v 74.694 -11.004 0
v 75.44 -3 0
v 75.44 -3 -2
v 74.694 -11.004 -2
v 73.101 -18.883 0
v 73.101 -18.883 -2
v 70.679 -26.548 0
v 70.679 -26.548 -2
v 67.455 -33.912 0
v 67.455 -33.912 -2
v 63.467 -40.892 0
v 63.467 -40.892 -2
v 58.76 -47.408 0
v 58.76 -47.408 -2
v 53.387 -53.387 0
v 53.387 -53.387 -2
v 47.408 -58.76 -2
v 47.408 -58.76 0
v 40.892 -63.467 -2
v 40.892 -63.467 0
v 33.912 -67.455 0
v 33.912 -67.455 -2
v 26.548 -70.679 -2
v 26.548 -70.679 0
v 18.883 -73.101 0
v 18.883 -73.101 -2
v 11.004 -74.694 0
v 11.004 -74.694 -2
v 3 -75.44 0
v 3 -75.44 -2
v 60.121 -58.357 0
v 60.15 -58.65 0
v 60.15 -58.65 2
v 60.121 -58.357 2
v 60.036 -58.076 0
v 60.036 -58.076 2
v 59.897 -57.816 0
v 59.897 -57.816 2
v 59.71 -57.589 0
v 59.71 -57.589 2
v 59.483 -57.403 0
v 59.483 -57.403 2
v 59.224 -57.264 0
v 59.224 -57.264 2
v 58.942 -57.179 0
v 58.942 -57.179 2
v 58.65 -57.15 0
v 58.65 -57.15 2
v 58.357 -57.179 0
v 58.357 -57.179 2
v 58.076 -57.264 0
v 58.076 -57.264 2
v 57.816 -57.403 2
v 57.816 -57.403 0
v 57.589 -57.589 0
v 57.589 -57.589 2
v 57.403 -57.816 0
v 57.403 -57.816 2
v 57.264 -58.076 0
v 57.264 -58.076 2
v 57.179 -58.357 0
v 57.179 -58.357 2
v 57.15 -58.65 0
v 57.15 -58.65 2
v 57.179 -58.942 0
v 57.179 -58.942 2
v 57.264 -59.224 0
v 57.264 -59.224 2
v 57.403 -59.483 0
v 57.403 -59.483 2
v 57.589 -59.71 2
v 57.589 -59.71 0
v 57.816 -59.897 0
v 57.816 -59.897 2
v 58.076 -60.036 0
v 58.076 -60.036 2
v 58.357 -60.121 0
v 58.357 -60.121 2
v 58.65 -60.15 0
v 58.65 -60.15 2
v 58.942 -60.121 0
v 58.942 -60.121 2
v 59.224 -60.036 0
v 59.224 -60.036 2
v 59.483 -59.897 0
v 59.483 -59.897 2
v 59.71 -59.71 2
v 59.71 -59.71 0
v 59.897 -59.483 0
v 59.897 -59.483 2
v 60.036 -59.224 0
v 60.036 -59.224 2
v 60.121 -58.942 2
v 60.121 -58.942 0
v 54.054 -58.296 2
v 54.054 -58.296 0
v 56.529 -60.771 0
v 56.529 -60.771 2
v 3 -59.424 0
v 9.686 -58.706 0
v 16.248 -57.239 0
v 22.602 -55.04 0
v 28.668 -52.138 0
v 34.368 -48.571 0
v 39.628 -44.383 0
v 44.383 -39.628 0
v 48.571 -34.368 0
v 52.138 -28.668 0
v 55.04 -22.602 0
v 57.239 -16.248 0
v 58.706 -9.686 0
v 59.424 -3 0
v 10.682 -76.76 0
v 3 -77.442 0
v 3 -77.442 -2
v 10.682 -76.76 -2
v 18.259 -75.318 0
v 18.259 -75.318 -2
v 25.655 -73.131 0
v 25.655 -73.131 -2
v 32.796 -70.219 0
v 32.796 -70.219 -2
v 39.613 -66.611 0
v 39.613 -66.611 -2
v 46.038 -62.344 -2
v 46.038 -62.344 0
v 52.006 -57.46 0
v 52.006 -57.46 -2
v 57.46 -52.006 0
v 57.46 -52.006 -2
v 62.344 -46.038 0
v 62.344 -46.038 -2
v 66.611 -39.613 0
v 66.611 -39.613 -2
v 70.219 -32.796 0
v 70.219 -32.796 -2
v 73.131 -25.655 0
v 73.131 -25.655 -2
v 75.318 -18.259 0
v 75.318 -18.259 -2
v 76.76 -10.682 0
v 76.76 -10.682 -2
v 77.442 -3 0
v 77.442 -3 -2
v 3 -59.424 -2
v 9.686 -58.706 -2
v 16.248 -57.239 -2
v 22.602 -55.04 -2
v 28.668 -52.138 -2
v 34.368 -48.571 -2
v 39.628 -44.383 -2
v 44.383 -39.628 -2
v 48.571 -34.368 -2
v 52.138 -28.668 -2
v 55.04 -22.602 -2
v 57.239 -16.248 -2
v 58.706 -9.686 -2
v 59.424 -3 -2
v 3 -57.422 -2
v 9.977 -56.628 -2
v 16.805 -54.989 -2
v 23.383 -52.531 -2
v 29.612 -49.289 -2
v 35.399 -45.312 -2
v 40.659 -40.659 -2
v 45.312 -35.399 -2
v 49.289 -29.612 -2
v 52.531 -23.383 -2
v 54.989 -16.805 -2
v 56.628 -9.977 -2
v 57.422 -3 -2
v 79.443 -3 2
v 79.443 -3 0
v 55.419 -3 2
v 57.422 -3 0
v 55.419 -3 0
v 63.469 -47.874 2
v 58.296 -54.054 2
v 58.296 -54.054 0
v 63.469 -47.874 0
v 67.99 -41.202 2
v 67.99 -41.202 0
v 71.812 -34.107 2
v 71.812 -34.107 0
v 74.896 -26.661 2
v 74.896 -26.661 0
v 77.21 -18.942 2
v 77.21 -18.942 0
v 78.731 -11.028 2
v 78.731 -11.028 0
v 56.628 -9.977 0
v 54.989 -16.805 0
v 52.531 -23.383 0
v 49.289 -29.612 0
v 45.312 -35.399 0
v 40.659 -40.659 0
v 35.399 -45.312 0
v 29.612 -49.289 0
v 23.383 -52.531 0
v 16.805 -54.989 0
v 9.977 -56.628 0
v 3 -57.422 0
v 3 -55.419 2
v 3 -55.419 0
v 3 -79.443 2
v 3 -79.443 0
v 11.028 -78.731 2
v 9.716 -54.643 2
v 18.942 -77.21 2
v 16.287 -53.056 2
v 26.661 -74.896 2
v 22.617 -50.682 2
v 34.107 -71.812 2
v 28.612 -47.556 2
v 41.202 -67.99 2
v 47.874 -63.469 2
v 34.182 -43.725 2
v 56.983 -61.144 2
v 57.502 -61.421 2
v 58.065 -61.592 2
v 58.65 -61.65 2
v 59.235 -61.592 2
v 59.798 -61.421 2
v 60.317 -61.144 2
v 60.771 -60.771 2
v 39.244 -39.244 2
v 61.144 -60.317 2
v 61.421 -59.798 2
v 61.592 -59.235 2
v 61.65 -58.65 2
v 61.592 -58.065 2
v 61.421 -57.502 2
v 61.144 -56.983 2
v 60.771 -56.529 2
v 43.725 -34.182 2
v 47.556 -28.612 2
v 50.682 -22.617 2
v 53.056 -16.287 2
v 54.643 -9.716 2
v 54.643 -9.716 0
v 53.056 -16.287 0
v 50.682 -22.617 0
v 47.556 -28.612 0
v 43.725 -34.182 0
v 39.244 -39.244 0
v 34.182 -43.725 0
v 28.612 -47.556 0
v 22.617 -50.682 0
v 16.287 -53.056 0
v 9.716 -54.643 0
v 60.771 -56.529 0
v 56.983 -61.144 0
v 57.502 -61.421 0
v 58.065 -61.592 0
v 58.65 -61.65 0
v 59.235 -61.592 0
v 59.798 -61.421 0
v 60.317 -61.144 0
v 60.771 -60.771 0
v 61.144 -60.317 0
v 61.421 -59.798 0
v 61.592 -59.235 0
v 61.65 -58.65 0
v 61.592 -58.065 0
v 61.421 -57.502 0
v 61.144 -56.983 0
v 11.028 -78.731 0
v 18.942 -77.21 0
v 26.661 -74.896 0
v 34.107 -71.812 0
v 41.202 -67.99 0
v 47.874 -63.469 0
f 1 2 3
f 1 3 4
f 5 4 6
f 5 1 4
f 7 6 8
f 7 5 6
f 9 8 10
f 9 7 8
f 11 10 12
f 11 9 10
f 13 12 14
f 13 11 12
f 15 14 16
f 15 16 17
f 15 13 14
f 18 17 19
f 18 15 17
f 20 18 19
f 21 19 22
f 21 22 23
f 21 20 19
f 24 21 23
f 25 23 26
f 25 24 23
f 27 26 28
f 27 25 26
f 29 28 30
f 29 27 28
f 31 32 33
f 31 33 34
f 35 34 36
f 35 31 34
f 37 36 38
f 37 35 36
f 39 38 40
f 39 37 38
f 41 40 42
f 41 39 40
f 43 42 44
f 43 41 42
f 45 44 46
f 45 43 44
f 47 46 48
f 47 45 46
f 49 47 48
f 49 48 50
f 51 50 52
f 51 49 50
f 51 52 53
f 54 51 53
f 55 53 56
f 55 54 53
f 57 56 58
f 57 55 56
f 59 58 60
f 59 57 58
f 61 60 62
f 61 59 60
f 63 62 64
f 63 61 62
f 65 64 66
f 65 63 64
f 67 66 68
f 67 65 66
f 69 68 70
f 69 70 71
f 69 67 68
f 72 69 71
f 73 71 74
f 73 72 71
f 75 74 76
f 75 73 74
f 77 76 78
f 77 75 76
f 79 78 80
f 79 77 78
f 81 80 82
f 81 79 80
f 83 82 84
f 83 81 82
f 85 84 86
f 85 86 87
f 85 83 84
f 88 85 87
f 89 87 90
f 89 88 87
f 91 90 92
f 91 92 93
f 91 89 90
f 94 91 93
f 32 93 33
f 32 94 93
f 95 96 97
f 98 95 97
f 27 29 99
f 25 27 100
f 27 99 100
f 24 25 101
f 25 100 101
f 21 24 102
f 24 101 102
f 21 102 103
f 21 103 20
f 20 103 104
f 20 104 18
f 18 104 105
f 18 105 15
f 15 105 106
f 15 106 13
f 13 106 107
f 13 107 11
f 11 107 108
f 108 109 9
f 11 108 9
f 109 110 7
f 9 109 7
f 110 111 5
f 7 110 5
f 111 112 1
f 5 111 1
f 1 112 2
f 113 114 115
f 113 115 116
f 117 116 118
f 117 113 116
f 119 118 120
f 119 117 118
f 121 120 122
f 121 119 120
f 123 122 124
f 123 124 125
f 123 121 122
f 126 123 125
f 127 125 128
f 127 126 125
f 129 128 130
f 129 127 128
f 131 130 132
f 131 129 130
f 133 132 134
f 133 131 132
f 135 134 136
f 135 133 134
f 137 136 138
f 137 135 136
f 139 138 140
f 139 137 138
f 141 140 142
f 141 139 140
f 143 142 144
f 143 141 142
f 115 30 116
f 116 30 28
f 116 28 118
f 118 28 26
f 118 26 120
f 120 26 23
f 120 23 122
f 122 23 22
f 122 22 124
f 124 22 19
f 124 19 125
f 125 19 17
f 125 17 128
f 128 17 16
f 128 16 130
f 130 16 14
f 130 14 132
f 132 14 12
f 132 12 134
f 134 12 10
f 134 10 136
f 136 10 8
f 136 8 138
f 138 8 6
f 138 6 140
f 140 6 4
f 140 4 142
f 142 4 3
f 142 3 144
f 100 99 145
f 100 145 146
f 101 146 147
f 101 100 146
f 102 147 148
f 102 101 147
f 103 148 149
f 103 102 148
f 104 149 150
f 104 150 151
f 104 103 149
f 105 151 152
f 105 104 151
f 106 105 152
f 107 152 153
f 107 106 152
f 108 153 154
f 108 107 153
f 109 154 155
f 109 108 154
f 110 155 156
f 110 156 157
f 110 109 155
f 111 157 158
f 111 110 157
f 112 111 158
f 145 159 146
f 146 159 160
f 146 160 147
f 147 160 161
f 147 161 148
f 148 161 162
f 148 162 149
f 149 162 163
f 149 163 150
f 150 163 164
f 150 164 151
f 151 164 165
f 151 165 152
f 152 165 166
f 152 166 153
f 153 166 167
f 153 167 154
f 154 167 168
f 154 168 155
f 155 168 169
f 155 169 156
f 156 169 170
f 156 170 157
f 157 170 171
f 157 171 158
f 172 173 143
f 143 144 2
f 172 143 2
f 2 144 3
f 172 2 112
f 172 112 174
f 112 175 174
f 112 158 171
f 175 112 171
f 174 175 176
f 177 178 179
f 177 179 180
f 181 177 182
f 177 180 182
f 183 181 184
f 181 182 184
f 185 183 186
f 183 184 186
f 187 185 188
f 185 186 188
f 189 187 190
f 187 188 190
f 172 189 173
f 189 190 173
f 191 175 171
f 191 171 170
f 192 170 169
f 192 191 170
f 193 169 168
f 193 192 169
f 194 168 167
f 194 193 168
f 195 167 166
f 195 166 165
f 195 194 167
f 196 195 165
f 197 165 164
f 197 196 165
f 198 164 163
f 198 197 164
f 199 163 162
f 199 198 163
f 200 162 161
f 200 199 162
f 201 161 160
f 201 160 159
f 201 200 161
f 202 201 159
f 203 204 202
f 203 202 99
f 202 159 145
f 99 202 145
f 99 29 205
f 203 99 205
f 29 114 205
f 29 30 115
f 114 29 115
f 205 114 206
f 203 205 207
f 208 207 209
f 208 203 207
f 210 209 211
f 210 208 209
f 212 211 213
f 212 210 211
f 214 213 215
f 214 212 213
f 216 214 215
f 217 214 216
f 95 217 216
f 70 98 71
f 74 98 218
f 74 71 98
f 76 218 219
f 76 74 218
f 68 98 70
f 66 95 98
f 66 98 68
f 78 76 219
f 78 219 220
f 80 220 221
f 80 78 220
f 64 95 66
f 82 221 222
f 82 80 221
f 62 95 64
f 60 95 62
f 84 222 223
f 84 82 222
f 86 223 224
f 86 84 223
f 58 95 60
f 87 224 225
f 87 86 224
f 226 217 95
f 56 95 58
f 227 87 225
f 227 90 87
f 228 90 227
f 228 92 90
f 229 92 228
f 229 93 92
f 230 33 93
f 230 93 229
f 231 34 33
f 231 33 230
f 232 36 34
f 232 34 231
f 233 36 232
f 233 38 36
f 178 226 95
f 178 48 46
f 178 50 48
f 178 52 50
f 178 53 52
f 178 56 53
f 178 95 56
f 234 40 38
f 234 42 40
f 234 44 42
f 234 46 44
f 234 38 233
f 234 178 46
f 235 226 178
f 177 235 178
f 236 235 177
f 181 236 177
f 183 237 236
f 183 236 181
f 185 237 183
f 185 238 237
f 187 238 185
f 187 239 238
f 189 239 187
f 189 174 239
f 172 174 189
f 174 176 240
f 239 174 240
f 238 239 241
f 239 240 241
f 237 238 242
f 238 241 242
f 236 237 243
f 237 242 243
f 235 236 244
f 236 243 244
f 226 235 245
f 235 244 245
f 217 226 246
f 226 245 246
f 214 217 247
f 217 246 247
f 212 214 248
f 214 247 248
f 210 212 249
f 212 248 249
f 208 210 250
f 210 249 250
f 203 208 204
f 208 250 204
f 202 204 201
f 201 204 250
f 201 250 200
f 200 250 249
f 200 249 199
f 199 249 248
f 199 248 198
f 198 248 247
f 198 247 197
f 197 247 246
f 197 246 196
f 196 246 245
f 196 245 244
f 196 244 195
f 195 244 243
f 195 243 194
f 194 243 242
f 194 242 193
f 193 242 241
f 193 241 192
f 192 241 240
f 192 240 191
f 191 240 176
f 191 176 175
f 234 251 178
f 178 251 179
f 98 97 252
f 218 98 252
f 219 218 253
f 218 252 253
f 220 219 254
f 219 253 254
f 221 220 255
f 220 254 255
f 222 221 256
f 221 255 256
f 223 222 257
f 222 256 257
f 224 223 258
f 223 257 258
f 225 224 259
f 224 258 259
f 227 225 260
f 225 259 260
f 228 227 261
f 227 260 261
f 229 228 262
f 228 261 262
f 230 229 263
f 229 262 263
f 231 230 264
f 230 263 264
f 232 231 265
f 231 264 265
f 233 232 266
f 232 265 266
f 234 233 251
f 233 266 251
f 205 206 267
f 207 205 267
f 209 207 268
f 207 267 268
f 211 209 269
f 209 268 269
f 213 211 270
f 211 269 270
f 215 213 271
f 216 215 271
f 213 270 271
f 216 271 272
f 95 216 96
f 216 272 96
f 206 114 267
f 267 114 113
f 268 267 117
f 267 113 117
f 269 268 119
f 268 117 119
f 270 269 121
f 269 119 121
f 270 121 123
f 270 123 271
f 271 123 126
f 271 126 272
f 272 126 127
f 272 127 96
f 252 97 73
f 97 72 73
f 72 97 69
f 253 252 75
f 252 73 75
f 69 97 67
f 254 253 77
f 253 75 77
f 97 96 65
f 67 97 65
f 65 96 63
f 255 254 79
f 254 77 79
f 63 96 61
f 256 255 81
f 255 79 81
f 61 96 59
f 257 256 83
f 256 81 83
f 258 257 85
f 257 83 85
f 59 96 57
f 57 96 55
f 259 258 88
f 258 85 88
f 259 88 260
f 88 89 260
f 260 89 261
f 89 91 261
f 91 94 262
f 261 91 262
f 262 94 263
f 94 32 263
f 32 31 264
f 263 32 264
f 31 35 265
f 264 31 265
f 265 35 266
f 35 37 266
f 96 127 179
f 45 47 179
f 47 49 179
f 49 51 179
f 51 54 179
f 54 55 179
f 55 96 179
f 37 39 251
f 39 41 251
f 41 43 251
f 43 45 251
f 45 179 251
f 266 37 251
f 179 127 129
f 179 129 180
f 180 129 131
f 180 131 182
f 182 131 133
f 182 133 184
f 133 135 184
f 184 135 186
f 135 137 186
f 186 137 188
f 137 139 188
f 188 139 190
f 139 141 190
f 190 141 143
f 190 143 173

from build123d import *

# Parameters (mm, degrees)
EXTRUDE_1_DEPTH = 2
EXTRUDE_2_DEPTH = 2
EXTRUDE_START   = -2
SKETCH_4_R      = 1.5
EXTRUDE_3_DEPTH = 2


with BuildPart() as part:
    # 草图2 → 凸台-拉伸1 (new body)
    with BuildSketch(Plane.XY):
        with BuildLine():
            Line((3, -77.441913716), (3, -79.443376061))
            ThreePointArc((3, -79.443376061), (56.214989104, -56.214989104), (79.443376061, -3))
            Line((79.443376061, -3), (77.441913716, -3))
            Line((77.441913716, -3), (55.418859606, -3))
            ThreePointArc((55.418859606, -3), (39.244426356, -39.244426356), (3, -55.418859606))
            Line((3, -55.418859606), (3, -77.441913716))
        make_face()
    extrude(amount=EXTRUDE_1_DEPTH)

    # 草图3 → 凸台-拉伸2 (add)
    with BuildSketch(Plane.XY):
        with BuildLine():
            Line((3, -57.421685799), (3, -59.42432162))
            ThreePointArc((3, -59.42432162), (42.072853481, -42.072853481), (59.42432162, -3))
            Line((59.42432162, -3), (57.421685799, -3))
            ThreePointArc((57.421685799, -3), (40.658639918, -40.658639918), (3, -57.421685799))
        make_face()
        with BuildLine():
            Line((77.441913716, -3), (75.440373806, -3))
            ThreePointArc((75.440373806, -3), (53.38656198, -53.38656198), (3, -75.440373806))
            Line((3, -75.440373806), (3, -77.441913716))
            ThreePointArc((3, -77.441913716), (54.800775542, -54.800775542), (77.441913716, -3))
        make_face()
    extrude(amount=-EXTRUDE_2_DEPTH)

    # 草图4 → 凸台-拉伸3 (add)
    with BuildSketch(Plane.XY.offset(2).offset(EXTRUDE_START)):
        with BuildLine():
            ThreePointArc((58.296270277, -54.05362959), (56.214989104, -56.214989104), (54.05362959, -58.296270277))
            Line((54.05362959, -58.296270277), (56.528503324, -60.771144011))
            ThreePointArc((56.528503324, -60.771144011), (60.771144011, -60.771144011), (60.771144011, -56.528503324))
            Line((60.771144011, -56.528503324), (58.296270277, -54.05362959))
        make_face()
        with Locations((58.649823667, -58.649823667)):
            Circle(SKETCH_4_R, mode=Mode.SUBTRACT)
    extrude(amount=EXTRUDE_3_DEPTH)


solid = part.part
